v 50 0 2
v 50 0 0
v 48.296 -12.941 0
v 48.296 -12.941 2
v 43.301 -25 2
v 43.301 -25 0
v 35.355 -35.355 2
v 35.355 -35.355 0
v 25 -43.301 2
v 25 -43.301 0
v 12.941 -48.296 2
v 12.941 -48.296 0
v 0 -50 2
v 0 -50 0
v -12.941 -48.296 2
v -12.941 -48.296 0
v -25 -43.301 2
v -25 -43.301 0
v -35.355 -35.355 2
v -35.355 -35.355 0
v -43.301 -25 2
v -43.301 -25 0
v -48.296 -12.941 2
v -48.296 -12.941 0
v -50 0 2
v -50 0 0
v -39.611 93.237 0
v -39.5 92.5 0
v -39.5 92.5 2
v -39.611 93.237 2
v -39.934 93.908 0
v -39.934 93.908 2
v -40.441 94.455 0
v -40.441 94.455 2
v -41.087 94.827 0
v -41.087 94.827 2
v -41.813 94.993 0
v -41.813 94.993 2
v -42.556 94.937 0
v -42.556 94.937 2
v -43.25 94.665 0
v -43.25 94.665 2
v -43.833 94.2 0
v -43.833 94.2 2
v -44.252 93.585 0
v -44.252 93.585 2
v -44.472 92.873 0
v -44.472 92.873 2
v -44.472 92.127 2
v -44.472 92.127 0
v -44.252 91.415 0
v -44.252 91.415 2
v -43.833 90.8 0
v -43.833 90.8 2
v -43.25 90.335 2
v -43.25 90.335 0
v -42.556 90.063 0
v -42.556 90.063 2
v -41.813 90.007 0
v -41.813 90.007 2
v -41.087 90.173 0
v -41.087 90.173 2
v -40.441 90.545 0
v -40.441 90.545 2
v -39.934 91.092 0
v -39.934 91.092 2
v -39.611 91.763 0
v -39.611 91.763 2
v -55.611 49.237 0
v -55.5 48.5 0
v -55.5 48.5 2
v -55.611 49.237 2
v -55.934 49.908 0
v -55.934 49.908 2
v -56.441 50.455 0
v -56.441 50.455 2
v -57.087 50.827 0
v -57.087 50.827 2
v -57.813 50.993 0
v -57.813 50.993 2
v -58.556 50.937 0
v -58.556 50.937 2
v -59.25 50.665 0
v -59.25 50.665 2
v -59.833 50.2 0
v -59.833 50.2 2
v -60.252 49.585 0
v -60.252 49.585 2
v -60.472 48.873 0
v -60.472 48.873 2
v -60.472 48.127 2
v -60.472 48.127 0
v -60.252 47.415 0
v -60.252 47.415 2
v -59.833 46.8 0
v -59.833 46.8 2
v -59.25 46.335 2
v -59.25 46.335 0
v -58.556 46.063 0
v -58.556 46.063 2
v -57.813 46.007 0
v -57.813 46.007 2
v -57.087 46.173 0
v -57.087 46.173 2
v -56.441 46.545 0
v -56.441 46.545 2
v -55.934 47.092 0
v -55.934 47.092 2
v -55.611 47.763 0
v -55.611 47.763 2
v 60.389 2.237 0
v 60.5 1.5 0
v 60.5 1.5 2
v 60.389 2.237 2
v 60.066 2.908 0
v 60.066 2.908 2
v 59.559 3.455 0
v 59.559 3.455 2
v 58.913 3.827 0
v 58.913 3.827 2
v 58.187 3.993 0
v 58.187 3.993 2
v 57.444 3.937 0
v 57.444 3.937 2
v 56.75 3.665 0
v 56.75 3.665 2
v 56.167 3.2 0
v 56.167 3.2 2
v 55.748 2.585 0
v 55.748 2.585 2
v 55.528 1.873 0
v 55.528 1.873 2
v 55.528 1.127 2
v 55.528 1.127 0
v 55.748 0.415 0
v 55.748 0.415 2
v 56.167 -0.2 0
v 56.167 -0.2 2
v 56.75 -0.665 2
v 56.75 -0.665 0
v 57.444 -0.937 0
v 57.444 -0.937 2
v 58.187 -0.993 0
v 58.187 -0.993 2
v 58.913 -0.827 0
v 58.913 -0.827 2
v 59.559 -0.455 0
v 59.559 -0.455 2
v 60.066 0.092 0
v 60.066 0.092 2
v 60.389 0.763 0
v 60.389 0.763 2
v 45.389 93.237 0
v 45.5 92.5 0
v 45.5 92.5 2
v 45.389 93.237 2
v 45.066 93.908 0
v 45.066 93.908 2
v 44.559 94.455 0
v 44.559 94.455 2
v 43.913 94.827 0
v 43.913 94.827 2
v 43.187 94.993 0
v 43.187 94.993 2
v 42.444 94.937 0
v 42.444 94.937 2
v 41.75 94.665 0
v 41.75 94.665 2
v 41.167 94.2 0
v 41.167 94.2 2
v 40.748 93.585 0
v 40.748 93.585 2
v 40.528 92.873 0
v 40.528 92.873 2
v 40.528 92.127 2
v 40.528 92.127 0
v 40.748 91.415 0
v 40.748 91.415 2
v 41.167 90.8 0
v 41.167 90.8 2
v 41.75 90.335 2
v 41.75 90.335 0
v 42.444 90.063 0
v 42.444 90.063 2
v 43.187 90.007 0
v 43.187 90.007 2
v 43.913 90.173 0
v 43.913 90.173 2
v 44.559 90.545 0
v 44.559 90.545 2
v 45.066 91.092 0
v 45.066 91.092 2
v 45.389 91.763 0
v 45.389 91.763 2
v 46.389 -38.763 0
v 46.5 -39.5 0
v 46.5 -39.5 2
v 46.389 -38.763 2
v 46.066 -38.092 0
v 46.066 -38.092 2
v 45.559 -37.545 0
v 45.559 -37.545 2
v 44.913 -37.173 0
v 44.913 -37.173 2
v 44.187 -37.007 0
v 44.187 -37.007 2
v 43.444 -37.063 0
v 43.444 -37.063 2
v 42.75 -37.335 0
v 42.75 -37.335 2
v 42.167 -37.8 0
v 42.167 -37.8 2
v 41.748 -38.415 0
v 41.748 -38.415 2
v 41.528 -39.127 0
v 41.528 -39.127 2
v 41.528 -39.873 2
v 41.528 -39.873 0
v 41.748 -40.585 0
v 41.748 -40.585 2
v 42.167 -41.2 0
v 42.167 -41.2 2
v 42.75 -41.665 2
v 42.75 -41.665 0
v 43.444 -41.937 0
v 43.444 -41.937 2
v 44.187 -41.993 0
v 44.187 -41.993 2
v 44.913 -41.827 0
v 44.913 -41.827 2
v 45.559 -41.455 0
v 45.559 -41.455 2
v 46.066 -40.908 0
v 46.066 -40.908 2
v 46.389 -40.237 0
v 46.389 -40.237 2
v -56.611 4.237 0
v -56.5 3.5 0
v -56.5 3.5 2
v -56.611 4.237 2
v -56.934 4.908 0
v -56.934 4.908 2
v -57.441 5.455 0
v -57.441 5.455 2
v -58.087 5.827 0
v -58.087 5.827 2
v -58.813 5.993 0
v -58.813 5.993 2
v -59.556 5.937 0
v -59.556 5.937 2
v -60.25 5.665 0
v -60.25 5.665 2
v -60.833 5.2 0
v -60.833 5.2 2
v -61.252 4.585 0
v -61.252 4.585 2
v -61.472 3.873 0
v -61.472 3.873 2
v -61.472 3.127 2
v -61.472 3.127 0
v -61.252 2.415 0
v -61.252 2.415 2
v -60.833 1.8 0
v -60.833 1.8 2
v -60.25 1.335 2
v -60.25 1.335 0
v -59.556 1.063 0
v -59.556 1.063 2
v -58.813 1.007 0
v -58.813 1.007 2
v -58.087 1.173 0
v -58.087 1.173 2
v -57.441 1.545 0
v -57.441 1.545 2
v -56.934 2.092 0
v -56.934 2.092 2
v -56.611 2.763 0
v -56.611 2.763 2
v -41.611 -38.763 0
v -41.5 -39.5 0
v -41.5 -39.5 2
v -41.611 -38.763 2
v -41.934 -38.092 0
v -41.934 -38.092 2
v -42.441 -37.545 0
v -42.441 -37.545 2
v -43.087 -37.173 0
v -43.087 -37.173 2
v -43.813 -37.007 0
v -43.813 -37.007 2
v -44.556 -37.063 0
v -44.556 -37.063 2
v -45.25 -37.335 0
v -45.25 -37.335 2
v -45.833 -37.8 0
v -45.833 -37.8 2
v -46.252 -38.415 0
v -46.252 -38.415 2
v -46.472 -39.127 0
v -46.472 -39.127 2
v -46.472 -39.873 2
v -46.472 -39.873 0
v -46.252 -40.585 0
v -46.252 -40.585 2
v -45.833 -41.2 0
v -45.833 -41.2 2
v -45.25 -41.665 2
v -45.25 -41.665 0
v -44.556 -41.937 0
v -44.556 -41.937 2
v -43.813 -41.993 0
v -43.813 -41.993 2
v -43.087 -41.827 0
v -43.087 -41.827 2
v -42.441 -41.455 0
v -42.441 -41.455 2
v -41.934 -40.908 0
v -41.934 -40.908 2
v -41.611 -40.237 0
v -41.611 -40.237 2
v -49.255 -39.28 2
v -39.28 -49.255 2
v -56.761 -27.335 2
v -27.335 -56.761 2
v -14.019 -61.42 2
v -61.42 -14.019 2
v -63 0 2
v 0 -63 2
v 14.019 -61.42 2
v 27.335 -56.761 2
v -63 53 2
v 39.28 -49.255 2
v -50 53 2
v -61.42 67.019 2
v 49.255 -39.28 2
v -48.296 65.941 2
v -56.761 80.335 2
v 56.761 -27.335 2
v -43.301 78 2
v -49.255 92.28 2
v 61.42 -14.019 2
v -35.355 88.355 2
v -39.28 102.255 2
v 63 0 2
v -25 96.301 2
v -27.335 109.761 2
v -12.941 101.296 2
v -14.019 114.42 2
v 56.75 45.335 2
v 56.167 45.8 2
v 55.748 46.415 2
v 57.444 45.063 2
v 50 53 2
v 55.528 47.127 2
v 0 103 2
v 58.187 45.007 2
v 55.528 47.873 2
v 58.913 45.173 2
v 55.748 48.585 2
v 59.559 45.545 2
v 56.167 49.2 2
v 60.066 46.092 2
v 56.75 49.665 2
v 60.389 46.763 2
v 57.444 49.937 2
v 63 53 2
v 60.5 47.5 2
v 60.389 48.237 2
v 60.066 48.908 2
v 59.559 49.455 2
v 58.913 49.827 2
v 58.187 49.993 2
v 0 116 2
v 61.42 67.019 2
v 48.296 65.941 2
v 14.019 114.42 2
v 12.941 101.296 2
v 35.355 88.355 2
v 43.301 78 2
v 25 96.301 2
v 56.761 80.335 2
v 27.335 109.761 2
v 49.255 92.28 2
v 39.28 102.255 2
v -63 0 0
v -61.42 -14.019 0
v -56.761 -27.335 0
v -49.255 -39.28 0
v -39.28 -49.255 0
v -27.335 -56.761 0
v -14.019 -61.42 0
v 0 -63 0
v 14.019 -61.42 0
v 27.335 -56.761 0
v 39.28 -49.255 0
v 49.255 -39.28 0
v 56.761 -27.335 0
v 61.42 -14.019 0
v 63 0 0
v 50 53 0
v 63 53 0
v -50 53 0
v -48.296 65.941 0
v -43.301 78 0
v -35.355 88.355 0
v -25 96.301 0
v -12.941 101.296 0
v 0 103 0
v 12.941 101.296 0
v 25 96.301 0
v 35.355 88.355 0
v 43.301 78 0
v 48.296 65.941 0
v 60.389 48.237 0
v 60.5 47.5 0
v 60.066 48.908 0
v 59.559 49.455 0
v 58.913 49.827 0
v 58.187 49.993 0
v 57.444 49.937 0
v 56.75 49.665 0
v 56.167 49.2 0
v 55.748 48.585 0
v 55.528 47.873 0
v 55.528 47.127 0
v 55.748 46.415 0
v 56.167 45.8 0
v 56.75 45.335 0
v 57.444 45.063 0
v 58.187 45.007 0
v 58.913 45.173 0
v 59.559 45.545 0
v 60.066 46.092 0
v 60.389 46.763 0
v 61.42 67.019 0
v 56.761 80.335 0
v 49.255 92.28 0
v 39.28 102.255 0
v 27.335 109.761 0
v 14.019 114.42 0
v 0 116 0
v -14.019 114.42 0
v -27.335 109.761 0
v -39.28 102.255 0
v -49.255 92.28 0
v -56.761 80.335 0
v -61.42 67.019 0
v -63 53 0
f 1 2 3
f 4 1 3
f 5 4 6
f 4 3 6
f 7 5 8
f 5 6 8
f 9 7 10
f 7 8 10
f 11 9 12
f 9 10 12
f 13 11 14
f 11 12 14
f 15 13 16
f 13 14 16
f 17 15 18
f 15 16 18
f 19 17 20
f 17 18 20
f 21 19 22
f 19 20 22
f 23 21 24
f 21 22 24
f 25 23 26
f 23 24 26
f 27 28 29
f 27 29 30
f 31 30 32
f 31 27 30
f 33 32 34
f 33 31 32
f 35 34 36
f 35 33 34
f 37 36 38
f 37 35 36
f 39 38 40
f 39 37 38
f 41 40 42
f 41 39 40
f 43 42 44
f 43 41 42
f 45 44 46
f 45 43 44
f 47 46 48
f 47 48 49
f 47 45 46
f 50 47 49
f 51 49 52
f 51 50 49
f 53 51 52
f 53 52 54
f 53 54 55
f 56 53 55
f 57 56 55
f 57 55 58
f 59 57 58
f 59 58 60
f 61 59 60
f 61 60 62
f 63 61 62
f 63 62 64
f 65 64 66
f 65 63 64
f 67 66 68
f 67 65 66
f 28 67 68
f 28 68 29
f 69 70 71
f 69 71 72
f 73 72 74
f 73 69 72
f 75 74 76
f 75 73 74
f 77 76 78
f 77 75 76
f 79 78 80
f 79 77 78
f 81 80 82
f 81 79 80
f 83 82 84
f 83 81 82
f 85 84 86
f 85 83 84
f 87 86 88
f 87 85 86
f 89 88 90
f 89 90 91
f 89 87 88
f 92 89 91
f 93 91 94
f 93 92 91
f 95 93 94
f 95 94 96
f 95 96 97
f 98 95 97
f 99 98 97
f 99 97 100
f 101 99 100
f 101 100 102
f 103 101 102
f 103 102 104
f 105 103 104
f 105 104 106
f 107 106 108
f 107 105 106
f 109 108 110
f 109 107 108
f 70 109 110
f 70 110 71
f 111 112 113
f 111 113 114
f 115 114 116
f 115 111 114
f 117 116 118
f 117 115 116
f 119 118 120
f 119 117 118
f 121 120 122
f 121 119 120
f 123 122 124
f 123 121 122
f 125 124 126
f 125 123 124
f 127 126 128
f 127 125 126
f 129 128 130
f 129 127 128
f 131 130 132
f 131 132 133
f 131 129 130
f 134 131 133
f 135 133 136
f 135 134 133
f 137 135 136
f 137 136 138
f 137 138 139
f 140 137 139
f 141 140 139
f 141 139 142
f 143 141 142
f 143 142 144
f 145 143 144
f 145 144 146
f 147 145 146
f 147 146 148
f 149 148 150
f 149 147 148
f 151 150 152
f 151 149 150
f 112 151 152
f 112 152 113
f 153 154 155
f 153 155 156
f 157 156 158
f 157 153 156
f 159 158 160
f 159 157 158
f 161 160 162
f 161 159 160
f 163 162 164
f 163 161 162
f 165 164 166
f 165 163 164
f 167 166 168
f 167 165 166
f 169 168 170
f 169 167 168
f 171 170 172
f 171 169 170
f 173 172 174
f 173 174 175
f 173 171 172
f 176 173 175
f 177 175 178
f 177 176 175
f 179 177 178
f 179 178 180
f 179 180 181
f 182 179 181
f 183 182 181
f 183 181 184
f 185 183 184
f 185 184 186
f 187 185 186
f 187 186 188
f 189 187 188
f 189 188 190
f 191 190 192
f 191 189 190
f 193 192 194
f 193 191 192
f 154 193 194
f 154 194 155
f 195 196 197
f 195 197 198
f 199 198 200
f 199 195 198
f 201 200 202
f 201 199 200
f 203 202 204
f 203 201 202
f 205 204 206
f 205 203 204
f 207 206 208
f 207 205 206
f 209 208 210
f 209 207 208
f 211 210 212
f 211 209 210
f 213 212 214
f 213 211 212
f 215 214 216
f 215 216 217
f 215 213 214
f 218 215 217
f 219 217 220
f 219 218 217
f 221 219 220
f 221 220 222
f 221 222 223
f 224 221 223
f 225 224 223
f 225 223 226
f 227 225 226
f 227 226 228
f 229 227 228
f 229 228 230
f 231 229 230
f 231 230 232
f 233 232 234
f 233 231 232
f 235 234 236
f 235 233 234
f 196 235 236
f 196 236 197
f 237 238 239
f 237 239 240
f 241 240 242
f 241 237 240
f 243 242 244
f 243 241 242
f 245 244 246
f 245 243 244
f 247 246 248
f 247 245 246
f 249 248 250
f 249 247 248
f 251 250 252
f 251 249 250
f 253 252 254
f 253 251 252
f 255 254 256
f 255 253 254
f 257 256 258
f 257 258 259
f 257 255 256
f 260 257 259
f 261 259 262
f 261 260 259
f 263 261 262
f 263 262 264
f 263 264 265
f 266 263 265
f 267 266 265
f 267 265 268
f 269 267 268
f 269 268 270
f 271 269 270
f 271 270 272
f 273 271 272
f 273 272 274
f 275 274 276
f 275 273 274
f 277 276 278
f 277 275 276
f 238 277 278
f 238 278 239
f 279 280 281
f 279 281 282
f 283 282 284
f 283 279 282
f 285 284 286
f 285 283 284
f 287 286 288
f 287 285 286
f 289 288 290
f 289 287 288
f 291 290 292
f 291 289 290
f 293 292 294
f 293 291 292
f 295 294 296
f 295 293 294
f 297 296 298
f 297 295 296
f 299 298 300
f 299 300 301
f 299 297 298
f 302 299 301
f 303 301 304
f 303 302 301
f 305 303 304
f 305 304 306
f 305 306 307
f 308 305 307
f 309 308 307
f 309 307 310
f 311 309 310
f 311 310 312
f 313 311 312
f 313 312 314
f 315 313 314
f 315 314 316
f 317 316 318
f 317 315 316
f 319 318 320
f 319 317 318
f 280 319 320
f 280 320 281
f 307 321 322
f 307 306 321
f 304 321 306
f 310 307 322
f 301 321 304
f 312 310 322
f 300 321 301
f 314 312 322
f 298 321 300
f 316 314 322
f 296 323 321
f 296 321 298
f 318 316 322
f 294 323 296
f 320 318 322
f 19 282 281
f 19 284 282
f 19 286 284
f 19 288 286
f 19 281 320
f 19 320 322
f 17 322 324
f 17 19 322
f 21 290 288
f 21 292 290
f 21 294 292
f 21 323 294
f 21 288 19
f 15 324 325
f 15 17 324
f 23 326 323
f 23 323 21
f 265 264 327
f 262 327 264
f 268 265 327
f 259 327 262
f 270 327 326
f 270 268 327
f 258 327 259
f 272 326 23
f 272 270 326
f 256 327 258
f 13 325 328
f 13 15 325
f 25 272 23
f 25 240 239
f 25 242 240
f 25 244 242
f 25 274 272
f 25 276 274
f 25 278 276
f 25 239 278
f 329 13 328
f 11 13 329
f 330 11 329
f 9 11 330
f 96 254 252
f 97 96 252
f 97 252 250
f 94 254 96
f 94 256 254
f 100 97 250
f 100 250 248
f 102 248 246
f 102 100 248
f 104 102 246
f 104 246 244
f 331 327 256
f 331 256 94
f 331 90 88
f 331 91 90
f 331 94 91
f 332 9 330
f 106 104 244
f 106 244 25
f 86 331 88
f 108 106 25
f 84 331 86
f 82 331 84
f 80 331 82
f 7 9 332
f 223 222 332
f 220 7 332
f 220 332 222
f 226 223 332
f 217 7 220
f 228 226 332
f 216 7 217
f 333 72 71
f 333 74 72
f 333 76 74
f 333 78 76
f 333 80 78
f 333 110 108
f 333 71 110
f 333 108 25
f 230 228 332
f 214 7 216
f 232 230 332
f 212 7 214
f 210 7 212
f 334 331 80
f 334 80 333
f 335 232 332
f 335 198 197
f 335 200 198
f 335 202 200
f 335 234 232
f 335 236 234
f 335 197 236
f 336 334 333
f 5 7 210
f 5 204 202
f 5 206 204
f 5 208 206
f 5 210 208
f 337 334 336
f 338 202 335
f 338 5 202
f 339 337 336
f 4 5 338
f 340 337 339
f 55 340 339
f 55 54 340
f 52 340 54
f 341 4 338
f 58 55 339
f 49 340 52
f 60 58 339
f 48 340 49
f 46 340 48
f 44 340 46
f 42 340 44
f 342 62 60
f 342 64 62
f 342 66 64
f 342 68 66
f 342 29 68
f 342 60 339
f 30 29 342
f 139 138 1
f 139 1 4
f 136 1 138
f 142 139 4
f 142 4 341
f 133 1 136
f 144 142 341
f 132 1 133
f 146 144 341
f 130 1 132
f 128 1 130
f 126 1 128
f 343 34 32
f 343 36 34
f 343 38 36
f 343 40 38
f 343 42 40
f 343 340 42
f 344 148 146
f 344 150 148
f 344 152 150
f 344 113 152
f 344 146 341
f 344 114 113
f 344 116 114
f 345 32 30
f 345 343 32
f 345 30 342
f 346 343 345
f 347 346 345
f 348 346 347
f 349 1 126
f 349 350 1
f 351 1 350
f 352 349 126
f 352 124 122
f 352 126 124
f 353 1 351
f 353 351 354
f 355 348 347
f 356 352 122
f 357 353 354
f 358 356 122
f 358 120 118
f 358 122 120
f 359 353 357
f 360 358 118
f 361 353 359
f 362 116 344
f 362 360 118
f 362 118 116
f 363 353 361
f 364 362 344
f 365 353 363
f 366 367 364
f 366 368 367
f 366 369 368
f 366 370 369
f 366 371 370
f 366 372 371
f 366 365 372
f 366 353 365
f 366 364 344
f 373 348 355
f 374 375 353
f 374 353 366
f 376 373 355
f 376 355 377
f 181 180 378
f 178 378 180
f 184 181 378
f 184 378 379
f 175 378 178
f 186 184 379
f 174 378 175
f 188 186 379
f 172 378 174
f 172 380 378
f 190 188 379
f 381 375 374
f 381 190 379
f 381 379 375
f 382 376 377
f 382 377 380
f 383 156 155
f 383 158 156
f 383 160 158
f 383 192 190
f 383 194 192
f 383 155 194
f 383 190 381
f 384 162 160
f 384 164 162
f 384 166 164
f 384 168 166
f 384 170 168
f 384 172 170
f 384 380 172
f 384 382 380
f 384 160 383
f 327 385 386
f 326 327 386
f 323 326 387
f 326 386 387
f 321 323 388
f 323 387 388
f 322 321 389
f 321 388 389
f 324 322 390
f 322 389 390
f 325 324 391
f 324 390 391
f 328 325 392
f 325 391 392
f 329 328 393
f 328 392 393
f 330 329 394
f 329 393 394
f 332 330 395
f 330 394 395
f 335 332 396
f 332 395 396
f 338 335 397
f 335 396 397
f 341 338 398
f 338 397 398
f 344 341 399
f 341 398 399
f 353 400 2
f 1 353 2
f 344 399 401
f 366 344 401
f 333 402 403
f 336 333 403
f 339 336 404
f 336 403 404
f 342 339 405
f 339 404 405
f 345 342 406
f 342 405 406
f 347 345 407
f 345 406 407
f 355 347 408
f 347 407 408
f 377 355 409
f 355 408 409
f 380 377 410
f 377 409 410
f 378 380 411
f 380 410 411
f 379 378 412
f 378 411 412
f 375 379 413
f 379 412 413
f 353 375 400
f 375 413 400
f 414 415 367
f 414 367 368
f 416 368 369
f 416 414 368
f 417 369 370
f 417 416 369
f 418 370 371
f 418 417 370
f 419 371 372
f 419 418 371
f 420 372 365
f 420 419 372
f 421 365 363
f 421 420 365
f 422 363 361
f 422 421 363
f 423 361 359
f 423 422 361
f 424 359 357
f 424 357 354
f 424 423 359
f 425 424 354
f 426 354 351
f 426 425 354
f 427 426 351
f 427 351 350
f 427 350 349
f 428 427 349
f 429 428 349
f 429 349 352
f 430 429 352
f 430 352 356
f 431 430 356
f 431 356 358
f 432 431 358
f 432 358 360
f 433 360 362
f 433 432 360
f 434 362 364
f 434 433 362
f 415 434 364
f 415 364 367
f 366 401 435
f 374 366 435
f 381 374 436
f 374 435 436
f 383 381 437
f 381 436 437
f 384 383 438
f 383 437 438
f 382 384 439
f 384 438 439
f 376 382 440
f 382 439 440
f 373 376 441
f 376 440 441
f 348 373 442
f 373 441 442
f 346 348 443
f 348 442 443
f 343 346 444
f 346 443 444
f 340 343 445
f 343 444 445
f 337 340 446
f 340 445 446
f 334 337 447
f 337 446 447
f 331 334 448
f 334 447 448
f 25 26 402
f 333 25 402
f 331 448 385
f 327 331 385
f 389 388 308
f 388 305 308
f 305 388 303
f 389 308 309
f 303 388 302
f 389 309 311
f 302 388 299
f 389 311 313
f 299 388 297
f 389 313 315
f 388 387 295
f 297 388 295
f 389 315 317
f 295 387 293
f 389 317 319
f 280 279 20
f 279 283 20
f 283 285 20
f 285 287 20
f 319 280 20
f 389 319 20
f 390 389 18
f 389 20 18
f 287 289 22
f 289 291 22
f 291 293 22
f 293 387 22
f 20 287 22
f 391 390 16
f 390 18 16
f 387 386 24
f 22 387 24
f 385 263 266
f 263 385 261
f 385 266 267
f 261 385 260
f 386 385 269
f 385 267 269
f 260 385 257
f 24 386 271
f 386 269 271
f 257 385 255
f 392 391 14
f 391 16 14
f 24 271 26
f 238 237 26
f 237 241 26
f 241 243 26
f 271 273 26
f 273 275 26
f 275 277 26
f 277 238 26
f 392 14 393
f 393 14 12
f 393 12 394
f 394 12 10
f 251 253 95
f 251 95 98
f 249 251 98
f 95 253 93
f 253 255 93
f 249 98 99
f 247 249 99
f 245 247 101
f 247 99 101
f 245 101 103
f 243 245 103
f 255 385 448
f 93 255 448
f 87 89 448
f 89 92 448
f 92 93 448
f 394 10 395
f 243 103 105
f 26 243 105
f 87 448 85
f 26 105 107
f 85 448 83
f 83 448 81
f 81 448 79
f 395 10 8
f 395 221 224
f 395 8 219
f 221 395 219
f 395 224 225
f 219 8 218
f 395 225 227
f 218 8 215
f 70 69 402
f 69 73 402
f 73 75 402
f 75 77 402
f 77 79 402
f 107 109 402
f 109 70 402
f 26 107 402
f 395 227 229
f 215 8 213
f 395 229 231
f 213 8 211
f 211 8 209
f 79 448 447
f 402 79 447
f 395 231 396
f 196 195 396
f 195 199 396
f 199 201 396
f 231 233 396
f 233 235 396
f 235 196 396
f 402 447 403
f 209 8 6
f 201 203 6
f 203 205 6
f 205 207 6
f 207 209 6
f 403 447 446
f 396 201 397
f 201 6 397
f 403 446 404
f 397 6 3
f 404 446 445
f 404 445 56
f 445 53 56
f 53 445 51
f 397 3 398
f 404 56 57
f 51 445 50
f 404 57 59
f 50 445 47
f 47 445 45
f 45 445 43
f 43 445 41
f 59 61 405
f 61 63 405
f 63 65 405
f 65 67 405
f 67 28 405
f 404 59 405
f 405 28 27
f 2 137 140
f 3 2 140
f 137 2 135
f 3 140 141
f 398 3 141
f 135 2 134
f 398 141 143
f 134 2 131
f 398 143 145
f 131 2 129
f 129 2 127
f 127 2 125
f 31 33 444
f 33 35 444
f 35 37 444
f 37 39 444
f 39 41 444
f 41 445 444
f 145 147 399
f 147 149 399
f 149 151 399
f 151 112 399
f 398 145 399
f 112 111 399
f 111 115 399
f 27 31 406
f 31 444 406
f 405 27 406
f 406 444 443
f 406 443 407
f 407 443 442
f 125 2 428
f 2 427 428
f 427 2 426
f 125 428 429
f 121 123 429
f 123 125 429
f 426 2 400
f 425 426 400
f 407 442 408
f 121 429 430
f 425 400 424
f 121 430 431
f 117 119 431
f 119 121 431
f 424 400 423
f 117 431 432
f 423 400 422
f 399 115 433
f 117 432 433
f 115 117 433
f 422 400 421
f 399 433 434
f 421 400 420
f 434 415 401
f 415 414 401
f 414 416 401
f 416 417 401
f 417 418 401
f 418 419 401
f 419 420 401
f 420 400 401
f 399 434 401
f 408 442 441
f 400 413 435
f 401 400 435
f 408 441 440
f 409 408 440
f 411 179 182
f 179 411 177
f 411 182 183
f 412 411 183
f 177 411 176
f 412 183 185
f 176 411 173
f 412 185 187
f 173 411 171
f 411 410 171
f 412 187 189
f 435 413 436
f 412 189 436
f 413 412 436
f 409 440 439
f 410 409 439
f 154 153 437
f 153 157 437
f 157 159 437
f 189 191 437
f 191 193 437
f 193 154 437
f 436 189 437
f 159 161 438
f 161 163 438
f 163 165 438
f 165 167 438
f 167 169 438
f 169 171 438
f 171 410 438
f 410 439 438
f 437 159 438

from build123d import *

# Parameters (mm, degrees)
F0_R     = 2.5
F1_DEPTH = 2


with BuildPart() as f1:
    # F0 (on Top) → F1 (new body)
    with BuildSketch(Plane.XY):
        with BuildLine():
            ThreePointArc((-50, 0), (0, -50), (50, 0))
            Line((50, 0), (50, 53))
            ThreePointArc((50, 53), (0, 103), (-50, 53))
            Line((-50, 53), (-50, 26.5))
            Line((-50, 26.5), (-50, 0))
        make_face()
        with BuildLine():
            Line((-63, 53), (-63, 26.5))
            Line((-63, 26.5), (-63, 0))
            ThreePointArc((-63, 0), (0, -63), (63, 0))
            Line((63, 0), (63, 53))
            ThreePointArc((63, 53), (0, 116), (-63, 53))
        make_face()
        with Locations((-44, -39.5)):
            Circle(F0_R, mode=Mode.SUBTRACT)
        with Locations((-59, 3.5)):
            Circle(F0_R, mode=Mode.SUBTRACT)
        with Locations((44, -39.5)):
            Circle(F0_R, mode=Mode.SUBTRACT)
        with Locations((58, 1.5)):
            Circle(F0_R, mode=Mode.SUBTRACT)
        with Locations((-58, 48.5)):
            Circle(F0_R, mode=Mode.SUBTRACT)
        with Locations((-42, 92.5)):
            Circle(F0_R, mode=Mode.SUBTRACT)
        with BuildLine():
            Line((50, 53), (50, 0))
            ThreePointArc((50, 0), (0, -50), (-50, 0))
            Line((-50, 0), (-50, 26.5))
            Line((-50, 26.5), (-50, 53))
            ThreePointArc((-50, 53), (0, 103), (50, 53))
        make_face(mode=Mode.SUBTRACT)
        with Locations((58, 47.5)):
            Circle(F0_R, mode=Mode.SUBTRACT)
        with Locations((43, 92.5)):
            Circle(F0_R, mode=Mode.SUBTRACT)
    extrude(amount=F1_DEPTH)


solid = f1.part
